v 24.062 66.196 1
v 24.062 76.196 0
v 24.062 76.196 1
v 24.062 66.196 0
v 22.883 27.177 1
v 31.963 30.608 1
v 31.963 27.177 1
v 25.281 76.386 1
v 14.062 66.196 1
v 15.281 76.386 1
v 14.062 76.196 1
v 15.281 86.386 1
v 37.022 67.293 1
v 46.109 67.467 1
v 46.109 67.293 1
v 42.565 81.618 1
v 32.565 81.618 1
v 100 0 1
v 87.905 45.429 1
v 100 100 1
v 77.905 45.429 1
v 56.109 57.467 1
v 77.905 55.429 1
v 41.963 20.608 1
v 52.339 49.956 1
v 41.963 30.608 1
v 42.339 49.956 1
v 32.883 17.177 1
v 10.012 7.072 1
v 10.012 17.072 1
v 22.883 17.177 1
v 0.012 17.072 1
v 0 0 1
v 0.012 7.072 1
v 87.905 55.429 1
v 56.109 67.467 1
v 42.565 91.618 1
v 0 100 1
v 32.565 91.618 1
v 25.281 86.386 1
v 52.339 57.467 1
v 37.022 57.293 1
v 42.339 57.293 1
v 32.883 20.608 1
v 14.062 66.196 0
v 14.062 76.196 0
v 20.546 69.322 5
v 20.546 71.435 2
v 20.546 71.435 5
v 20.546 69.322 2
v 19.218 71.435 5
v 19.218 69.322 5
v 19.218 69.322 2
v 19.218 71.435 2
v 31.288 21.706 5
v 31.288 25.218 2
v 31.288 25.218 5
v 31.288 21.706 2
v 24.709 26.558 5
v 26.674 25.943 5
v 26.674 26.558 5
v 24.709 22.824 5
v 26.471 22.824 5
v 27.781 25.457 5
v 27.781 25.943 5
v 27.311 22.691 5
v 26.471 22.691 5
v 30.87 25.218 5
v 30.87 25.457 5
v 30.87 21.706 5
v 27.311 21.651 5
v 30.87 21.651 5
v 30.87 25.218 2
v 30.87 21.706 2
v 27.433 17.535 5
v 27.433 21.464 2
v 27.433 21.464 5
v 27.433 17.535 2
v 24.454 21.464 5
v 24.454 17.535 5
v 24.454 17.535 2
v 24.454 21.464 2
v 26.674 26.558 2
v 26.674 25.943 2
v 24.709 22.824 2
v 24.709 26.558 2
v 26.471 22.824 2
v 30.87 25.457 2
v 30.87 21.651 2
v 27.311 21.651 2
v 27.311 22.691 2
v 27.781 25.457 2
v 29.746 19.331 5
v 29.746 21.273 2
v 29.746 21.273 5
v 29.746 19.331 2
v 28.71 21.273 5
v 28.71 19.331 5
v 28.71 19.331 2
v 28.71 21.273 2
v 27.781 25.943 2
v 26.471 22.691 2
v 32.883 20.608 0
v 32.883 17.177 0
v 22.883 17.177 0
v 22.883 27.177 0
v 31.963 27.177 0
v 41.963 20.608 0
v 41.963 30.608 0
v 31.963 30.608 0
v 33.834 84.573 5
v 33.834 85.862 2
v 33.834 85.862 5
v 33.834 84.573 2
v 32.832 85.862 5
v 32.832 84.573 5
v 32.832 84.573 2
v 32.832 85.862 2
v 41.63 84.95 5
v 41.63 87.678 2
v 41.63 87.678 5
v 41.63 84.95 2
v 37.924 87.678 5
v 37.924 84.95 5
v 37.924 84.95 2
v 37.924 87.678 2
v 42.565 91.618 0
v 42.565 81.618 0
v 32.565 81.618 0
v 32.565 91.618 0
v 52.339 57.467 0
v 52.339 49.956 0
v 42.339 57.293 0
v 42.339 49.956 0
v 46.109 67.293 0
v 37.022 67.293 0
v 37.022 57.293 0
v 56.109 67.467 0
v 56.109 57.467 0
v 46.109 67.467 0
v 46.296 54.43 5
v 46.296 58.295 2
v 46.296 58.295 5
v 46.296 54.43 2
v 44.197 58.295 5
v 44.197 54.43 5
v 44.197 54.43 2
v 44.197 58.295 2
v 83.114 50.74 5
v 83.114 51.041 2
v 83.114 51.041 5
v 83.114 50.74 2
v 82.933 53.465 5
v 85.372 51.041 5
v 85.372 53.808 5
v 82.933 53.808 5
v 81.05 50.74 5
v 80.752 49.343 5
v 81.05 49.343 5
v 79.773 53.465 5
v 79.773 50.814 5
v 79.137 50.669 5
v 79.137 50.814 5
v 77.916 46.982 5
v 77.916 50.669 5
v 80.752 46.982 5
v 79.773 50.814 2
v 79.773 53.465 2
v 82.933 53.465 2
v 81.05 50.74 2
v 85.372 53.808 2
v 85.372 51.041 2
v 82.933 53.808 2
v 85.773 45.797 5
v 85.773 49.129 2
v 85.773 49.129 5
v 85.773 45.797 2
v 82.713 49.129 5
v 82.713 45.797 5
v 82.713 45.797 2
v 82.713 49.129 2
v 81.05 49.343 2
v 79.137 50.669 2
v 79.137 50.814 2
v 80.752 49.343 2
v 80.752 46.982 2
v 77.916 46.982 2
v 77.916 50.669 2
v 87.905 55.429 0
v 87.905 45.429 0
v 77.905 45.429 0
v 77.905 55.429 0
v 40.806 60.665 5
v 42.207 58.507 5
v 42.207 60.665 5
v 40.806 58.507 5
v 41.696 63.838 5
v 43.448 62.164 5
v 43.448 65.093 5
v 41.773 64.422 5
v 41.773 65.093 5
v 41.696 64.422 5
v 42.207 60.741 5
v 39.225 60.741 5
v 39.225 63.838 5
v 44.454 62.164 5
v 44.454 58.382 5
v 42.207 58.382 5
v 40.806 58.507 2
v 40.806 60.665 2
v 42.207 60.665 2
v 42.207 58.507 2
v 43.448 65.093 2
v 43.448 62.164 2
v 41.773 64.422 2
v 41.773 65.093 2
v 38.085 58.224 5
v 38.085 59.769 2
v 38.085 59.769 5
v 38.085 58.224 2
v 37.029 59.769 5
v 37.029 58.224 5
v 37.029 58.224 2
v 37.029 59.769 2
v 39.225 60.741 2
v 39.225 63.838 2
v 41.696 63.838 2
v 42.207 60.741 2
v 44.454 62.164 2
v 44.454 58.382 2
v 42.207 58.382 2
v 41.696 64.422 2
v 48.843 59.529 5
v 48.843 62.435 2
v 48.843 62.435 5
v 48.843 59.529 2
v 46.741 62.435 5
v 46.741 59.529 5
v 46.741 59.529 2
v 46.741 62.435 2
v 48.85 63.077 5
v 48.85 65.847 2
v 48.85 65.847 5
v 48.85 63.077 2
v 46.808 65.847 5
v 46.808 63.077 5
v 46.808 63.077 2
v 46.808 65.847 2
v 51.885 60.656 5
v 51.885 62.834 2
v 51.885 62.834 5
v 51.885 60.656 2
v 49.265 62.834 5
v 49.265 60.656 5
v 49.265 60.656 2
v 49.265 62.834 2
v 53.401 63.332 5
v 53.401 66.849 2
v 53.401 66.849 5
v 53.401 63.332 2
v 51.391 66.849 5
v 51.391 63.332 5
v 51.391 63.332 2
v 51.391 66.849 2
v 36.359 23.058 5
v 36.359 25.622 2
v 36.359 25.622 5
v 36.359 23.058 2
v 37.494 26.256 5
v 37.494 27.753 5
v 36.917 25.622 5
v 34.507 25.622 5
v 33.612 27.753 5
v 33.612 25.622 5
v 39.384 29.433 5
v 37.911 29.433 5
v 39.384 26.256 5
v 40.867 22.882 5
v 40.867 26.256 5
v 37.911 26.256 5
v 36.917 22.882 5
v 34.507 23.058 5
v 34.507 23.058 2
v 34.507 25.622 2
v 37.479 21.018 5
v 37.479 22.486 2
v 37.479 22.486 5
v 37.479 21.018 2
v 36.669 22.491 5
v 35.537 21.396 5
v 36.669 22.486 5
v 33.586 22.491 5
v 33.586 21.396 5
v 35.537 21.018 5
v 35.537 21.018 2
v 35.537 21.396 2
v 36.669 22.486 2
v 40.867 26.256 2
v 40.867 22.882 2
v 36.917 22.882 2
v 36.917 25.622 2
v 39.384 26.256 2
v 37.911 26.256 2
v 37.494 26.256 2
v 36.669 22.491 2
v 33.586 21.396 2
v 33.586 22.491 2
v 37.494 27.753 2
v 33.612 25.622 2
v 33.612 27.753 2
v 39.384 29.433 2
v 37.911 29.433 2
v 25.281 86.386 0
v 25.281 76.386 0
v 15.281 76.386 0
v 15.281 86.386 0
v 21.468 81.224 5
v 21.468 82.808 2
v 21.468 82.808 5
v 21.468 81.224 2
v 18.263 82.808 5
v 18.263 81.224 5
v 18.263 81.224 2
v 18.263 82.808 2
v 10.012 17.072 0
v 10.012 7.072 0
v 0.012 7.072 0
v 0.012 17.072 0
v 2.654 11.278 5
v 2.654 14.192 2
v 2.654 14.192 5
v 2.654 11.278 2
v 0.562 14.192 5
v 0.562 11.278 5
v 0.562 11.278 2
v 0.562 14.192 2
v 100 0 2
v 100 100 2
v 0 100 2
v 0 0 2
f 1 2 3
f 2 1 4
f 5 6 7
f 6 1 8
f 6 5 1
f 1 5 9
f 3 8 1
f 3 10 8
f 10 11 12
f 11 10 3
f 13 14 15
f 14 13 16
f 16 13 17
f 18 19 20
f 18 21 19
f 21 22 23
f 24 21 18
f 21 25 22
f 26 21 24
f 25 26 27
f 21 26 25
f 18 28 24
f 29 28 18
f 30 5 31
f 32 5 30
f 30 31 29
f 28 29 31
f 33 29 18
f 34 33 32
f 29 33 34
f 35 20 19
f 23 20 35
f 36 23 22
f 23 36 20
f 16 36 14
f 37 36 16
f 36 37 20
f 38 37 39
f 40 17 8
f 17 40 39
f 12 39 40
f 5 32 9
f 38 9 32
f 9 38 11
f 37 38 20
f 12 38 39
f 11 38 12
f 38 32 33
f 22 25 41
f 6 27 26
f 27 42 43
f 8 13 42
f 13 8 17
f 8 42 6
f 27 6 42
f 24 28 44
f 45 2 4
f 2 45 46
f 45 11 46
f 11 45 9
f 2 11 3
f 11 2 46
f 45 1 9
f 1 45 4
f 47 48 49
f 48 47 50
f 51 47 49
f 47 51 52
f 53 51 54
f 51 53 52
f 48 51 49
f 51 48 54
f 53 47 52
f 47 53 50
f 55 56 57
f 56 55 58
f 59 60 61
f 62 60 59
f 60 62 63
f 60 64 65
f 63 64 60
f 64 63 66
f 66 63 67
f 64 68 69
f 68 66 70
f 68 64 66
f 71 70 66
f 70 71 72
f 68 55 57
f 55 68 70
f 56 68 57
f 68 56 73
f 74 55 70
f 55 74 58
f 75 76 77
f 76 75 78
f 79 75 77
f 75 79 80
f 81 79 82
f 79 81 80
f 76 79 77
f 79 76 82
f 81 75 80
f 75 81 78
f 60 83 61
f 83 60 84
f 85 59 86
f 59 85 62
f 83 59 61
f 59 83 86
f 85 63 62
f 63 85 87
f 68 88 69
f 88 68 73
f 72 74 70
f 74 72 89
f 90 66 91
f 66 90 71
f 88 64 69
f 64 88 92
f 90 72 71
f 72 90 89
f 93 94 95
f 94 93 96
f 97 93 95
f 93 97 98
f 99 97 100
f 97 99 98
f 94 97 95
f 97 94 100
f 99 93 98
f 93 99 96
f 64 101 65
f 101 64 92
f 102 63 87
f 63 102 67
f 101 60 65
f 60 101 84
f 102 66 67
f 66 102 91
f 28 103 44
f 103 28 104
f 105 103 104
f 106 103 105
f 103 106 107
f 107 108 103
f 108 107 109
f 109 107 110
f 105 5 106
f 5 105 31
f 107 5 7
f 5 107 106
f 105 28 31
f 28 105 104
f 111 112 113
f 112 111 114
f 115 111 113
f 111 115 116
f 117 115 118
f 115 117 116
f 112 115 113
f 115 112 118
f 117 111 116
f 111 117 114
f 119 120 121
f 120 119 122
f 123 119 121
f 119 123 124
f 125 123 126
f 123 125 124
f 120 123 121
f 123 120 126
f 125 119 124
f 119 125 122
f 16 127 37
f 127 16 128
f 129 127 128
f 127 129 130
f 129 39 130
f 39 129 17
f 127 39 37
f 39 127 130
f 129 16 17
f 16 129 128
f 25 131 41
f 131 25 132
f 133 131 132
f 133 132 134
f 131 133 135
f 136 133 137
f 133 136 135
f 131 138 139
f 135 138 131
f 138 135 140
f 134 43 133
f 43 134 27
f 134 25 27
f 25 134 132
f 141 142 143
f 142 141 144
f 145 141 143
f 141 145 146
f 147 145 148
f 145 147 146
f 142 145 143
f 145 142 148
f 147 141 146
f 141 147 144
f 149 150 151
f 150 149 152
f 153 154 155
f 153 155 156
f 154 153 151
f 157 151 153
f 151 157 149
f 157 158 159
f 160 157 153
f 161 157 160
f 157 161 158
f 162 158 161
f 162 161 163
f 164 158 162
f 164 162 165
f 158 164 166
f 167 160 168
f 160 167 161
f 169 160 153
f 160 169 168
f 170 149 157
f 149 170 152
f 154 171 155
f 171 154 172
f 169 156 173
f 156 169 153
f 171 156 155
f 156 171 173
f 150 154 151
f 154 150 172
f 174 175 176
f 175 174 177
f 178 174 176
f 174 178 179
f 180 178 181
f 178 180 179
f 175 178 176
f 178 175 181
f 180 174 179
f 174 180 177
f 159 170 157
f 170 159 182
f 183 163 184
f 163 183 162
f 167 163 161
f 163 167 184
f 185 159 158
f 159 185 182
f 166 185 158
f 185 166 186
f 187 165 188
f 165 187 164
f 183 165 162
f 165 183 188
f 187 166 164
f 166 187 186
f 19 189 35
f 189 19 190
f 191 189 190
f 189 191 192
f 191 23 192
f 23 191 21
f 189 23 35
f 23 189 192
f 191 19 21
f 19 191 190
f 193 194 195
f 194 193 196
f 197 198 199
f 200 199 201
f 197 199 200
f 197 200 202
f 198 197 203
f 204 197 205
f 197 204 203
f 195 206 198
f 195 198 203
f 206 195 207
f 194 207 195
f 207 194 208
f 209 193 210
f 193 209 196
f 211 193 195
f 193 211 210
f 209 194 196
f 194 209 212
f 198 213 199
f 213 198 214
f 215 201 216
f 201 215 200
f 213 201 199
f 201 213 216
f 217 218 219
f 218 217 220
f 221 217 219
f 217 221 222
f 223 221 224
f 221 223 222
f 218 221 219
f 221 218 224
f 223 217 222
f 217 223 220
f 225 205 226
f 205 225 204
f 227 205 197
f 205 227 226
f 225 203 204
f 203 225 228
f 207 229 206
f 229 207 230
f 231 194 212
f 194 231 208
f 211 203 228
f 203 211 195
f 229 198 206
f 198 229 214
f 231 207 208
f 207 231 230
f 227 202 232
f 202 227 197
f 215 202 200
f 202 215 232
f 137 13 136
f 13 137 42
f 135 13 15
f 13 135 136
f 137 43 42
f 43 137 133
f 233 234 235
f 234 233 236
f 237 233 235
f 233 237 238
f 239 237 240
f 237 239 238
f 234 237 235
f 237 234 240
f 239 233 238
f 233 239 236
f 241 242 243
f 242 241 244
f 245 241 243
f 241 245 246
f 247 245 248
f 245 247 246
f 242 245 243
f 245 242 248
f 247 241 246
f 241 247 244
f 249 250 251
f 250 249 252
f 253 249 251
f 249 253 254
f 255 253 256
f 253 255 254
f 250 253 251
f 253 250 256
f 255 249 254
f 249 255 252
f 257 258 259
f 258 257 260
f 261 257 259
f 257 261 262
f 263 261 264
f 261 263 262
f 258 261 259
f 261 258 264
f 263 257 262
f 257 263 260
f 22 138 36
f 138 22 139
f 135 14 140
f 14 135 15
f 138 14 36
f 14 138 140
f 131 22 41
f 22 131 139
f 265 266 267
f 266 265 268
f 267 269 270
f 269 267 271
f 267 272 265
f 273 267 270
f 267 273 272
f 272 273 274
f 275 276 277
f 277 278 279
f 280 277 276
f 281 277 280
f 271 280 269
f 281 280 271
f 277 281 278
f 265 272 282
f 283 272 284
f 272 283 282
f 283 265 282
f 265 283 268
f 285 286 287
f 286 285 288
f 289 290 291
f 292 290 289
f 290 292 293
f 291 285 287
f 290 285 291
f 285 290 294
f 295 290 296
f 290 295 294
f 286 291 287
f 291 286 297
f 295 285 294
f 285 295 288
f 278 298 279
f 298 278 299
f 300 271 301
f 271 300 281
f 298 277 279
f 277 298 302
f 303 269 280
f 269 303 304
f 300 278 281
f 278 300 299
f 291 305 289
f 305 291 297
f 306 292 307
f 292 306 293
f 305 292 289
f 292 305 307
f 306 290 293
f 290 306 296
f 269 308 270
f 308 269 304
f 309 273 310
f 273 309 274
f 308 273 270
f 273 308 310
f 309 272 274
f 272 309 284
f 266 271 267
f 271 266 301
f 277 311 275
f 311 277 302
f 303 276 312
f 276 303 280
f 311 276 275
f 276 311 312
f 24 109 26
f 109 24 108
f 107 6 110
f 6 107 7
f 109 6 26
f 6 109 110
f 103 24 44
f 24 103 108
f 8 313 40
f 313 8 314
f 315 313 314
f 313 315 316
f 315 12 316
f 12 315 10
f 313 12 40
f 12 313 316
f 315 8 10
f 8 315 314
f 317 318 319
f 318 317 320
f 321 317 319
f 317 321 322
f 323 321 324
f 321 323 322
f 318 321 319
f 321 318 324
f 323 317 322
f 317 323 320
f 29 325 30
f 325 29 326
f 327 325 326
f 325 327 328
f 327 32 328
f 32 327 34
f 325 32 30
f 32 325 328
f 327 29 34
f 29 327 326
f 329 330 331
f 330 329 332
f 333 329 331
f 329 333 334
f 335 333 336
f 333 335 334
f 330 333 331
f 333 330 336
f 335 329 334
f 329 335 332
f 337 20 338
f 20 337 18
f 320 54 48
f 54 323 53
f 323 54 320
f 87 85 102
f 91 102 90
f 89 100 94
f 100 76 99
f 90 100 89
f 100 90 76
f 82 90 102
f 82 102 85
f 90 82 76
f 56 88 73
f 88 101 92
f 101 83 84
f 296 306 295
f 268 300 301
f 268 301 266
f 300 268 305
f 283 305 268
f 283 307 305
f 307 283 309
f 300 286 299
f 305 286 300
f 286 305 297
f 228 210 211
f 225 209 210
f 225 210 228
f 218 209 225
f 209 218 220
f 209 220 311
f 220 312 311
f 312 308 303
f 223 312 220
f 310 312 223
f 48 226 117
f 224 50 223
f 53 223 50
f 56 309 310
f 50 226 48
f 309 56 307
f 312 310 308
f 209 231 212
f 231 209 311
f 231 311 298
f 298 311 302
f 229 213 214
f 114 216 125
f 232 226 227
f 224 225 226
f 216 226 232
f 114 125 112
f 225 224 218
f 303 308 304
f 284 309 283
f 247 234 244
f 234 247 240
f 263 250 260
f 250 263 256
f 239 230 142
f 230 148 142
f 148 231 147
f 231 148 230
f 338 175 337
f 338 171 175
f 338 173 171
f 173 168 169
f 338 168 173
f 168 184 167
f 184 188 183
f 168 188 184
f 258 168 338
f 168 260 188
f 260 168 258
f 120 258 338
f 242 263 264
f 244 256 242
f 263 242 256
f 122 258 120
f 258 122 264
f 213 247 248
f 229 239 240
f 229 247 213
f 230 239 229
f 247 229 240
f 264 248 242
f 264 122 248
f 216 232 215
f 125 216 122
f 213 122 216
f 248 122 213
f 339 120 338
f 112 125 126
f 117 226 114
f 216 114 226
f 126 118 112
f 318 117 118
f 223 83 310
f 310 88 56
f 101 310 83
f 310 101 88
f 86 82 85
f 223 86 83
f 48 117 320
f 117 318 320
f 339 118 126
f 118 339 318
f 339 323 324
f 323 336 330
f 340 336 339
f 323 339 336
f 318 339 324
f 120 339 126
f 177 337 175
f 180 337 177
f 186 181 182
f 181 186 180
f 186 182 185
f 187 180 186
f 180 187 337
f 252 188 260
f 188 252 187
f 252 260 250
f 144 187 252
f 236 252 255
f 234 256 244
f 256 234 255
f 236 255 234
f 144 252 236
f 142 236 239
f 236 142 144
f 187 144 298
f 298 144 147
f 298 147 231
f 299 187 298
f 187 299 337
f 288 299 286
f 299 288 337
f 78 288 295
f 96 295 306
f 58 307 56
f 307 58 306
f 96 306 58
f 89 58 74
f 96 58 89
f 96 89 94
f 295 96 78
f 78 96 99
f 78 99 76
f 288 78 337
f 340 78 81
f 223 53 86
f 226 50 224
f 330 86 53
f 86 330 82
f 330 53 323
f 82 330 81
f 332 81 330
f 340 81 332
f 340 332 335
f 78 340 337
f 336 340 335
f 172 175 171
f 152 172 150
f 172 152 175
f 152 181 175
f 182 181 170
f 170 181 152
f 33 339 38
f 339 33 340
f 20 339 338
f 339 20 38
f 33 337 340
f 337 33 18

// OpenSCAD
$fn=100;

function rand(max) = rands(0,max,1)[0];

// gridsize = 100;
gridheight = 1;

nodeheight = 1;
minnodesize = 10;
maxnodesize = 10;
// numnodes = 10;

minappsize = 1;
maxappsize = 4;
maxnumapps = 7;

// an app is a small blue box
module app(x,y,z, u,v,w) {
    color("blue") translate([x,y,z]) cube([u,v,w]);
}

// a node is a medium-sized green box
module node(x,y,z, u,v,w) {
    color("green") translate([x,y,z]) cube([u,v,w]);
    // a node contains a random number of apps
    numapps = rand(maxnumapps);
    for (i=[1:numapps]) {
        // all sizes are between minappsize and maxappsize
        d = minappsize + rand(maxappsize-minappsize);
        e = minappsize + rand(maxappsize-minappsize);
        f = maxappsize;
        // all coordinates are between 0 and the max for that axis
        a = x+rand(u-maxappsize);
        b = y+rand(v-maxappsize);
        c = w;
        app(a,b,c,d,e,f);
    }
}

// the grid is an orange plane
module promisegrid(x,y,z, u,v,w) {
    color("orange") translate([x,y,z]) cube([u,v,w]);
}

// generate an overview of everything
module all(numnodes, gridsize) {
    // generate a large plane, color it orange, place it at 0,0,-gridheight
    promisegrid(0,0,nodeheight, gridsize,gridsize,gridheight);

    // generate numnodes nodes, each with random x,y coordinates and random sizes
    for (i=[1:numnodes]) {
        // all sizes are between minnodesize and maxnodesize
        u = minnodesize + rand(maxnodesize-minnodesize);
        v = minnodesize + rand(maxnodesize-minnodesize);
        w = nodeheight;
        // all coordinates are between 0 and gridsize-maxnodesize
        z = 0;
        // if numnodes == 1, then the node will be placed at 0,0,0
        if (numnodes == 1) {
            x = 0;
            y = 0;
            node(x,y,z,u,v,w);
        } else {
            x = rand(gridsize-maxnodesize);
            y = rand(gridsize-maxnodesize);
            node(x,y,z,u,v,w);
        }
    }

}

all(10, 100);
// all(1, 0);
